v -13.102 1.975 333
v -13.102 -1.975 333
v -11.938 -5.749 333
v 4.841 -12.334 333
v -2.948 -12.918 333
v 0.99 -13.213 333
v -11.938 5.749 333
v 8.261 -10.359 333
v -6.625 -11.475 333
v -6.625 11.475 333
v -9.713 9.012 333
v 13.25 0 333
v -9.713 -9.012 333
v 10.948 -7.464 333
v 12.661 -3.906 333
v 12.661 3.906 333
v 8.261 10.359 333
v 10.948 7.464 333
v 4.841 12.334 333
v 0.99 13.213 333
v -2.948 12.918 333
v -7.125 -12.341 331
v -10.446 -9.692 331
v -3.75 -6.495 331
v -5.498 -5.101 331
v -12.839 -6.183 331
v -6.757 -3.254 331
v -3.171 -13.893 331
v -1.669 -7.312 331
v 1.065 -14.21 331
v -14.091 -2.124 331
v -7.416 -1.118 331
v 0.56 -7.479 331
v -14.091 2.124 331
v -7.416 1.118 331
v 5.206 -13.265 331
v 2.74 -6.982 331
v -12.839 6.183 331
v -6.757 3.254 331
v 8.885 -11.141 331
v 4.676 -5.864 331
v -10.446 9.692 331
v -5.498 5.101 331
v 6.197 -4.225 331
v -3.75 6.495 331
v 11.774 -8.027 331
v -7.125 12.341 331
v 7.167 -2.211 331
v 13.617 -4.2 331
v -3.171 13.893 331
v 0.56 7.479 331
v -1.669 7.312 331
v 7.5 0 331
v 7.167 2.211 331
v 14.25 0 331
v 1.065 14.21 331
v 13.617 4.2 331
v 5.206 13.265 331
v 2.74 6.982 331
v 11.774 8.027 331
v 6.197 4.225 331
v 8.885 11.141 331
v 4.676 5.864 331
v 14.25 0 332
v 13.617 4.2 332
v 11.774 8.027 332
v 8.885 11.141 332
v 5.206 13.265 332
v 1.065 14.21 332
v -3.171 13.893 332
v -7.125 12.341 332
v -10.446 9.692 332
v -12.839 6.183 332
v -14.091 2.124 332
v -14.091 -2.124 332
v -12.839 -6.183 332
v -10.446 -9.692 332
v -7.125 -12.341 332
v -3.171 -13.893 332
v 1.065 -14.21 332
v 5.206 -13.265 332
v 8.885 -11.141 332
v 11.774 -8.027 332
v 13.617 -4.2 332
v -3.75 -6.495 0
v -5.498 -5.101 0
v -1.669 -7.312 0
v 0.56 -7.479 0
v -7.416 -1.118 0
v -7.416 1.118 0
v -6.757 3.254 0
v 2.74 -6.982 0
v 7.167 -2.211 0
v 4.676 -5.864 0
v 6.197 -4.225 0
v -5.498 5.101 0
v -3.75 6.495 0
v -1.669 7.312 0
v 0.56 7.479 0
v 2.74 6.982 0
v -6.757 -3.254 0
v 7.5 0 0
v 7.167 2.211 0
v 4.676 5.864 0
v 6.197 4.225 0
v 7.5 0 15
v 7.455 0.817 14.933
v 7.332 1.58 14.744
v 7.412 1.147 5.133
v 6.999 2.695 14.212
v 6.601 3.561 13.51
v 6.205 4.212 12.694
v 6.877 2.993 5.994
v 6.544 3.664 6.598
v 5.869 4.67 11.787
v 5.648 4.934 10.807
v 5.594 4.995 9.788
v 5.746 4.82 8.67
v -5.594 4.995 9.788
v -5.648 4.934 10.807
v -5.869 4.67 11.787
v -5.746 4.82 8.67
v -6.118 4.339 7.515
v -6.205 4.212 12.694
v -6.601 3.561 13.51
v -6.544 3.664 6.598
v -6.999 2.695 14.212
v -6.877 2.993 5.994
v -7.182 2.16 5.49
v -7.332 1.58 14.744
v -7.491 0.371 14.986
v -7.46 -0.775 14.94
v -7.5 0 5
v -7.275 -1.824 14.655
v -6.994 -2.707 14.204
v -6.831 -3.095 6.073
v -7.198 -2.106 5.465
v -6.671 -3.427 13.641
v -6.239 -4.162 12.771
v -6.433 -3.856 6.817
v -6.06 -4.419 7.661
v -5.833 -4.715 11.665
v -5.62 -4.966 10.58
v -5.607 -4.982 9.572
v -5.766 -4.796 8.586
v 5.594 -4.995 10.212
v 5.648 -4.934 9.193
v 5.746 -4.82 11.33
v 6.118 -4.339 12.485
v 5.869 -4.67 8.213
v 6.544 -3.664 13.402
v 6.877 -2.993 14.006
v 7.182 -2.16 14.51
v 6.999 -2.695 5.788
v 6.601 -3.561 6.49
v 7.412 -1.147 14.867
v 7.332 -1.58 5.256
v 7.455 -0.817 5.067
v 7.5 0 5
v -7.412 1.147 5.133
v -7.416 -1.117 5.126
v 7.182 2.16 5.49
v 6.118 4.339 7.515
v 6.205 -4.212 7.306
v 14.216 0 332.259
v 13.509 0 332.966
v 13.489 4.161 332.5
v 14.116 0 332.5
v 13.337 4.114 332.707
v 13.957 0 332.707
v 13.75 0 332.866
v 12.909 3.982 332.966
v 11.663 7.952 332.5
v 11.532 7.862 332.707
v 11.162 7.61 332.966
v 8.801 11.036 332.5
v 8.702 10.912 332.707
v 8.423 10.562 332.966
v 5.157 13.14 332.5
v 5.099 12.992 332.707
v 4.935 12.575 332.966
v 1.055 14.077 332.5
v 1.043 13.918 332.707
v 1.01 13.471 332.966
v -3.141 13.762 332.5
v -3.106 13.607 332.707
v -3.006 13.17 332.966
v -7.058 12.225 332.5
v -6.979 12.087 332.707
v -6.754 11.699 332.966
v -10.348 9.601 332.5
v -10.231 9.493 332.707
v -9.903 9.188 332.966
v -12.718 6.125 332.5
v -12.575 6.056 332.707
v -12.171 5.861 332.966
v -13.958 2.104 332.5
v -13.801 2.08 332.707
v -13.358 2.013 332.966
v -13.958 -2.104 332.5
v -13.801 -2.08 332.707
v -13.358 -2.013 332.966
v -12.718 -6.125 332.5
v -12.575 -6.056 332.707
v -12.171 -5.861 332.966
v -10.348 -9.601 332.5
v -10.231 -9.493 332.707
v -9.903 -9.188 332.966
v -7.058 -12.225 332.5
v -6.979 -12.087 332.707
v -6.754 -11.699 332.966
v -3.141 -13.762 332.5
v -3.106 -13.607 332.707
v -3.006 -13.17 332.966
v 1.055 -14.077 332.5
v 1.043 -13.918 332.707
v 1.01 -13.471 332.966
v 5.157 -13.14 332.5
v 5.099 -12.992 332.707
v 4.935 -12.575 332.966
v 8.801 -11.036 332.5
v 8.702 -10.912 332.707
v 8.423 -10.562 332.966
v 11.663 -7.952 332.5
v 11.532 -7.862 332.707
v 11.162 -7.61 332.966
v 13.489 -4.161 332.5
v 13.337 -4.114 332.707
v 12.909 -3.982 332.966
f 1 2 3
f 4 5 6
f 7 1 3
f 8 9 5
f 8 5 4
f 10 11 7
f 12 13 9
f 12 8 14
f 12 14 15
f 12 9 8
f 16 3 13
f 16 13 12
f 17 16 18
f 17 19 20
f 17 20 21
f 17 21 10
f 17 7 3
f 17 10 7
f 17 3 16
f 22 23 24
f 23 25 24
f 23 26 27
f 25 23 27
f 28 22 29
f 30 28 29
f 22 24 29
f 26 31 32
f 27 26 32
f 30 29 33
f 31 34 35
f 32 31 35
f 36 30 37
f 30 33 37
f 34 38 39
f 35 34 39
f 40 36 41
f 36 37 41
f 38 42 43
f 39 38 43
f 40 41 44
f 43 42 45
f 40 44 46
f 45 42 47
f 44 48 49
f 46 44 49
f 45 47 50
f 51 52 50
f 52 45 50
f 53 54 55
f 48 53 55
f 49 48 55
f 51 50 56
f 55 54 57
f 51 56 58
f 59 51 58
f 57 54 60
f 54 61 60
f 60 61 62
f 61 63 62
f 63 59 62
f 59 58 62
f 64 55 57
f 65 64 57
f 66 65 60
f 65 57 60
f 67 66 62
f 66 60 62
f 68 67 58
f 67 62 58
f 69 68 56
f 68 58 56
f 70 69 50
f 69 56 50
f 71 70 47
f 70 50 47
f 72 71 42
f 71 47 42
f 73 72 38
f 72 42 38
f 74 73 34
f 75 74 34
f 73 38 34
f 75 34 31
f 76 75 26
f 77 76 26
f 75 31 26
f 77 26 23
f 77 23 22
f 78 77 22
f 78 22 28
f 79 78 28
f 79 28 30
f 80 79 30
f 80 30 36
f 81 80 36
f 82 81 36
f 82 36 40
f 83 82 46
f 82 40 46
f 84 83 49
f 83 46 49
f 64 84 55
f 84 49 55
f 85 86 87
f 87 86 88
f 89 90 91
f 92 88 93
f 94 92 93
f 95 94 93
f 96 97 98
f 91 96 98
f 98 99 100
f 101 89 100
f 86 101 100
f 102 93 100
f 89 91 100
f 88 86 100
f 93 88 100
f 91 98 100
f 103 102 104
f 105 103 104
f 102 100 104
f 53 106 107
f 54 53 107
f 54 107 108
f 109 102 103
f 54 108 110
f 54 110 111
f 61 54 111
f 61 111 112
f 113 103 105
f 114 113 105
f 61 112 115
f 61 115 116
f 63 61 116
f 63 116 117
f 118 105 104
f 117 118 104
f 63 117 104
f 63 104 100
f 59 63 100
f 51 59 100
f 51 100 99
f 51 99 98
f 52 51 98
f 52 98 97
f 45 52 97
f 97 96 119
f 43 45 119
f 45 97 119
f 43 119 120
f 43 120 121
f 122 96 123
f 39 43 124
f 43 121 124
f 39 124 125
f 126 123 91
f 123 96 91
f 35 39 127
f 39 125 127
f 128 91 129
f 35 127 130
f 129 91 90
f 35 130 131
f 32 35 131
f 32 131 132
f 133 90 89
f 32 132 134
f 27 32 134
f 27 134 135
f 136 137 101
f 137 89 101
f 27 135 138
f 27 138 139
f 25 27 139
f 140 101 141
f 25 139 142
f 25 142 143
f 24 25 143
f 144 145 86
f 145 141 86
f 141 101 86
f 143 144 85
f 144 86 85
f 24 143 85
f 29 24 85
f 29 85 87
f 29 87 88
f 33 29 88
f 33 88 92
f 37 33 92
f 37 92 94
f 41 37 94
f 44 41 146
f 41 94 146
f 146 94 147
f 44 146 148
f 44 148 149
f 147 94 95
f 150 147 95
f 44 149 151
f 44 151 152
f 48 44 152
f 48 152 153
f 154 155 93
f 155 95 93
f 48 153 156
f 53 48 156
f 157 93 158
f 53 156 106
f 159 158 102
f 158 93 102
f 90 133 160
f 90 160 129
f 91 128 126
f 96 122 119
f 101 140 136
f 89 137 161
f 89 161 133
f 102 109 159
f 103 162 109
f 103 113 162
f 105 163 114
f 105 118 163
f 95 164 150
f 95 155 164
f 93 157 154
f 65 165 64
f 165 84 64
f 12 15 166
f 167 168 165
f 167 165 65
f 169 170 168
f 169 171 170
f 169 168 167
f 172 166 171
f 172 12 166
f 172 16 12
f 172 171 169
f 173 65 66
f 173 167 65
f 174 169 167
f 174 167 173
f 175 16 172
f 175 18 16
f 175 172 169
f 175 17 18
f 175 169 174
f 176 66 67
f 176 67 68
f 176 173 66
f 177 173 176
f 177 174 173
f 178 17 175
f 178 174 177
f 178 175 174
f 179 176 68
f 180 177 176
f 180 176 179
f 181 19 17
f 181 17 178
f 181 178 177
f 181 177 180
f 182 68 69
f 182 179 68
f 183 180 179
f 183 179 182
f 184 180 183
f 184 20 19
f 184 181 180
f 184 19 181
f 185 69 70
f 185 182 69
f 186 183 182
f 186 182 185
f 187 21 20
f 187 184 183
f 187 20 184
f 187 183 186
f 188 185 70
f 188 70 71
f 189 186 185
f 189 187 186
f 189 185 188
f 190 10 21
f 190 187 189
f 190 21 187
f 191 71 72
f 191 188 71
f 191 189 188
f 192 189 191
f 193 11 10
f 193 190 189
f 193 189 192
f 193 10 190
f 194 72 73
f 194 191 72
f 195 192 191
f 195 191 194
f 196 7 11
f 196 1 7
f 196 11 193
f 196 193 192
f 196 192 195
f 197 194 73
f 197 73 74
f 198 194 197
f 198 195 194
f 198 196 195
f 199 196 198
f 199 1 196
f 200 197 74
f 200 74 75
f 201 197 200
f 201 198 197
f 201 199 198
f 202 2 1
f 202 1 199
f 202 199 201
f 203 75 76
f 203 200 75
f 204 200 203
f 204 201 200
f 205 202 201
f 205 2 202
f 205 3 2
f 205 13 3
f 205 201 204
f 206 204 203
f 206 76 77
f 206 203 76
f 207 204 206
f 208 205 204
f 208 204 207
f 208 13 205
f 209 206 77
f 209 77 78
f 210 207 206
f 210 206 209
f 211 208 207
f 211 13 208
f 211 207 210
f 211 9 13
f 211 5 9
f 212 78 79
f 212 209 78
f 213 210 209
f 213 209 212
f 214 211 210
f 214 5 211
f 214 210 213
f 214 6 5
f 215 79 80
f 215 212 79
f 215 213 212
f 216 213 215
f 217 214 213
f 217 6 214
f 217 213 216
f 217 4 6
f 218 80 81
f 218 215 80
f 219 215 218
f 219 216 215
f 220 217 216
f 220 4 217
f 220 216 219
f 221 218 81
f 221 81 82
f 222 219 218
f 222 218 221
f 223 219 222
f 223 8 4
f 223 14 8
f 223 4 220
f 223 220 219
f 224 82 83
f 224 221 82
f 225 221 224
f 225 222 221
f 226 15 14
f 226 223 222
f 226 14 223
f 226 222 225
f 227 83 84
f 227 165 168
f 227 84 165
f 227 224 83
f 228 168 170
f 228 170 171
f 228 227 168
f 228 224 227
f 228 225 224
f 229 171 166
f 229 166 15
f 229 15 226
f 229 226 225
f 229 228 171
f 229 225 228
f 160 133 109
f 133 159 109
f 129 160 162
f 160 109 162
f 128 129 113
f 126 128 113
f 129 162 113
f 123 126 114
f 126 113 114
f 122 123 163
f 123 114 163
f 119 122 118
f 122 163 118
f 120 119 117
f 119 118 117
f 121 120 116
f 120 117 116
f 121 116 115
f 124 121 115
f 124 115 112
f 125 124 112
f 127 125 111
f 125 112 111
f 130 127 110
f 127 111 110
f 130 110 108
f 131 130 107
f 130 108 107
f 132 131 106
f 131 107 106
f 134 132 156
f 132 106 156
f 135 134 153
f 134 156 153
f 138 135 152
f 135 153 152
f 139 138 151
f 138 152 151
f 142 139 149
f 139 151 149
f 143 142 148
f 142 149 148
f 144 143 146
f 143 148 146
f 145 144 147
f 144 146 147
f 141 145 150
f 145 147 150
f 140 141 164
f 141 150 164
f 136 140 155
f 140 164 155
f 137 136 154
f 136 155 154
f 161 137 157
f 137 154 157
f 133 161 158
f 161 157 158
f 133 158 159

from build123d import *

# Parameters (mm, degrees)
IZIM1_R                     = 7.5
Y_KSEKLIK_EKSTR_ZYON1_DEPTH = 331
IZIM2_R                     = 14.25
Y_KSEKLIK_EKSTR_ZYON2_DEPTH = 2
RADYUS1_R                   = 1
IZIM6_R                     = 5
KES_EKSTR_ZYON1_DEPTH       = 22


with BuildPart() as part:
    # Çizim1 → Yükseklik-Ekstrüzyon1 (new body)
    with BuildSketch(Plane.XY):
        Circle(IZIM1_R)
    extrude(amount=Y_KSEKLIK_EKSTR_ZYON1_DEPTH)

    # Çizim2 → Yükseklik-Ekstrüzyon2 (add)
    with BuildSketch(Plane.XY.offset(331)):
        Circle(IZIM2_R)
    extrude(amount=Y_KSEKLIK_EKSTR_ZYON2_DEPTH)

    # Radyus1
    radyus1_edges = [part.edges().sort_by_distance(p)[0] for p in [
        (-14.25, 0, 333),
    ]]
    fillet(radyus1_edges, radius=RADYUS1_R)

    # Çizim6 → Kes-Ekstrüzyon1 (cut, symmetric)
    with BuildSketch(Plane(origin=(0, 0, 0), x_dir=(0, 0, -1), z_dir=(1, 0, 0))):
        with Locations((-10, 0)):
            Circle(IZIM6_R)
    extrude(amount=KES_EKSTR_ZYON1_DEPTH, both=True, mode=Mode.SUBTRACT)


solid = part.part
